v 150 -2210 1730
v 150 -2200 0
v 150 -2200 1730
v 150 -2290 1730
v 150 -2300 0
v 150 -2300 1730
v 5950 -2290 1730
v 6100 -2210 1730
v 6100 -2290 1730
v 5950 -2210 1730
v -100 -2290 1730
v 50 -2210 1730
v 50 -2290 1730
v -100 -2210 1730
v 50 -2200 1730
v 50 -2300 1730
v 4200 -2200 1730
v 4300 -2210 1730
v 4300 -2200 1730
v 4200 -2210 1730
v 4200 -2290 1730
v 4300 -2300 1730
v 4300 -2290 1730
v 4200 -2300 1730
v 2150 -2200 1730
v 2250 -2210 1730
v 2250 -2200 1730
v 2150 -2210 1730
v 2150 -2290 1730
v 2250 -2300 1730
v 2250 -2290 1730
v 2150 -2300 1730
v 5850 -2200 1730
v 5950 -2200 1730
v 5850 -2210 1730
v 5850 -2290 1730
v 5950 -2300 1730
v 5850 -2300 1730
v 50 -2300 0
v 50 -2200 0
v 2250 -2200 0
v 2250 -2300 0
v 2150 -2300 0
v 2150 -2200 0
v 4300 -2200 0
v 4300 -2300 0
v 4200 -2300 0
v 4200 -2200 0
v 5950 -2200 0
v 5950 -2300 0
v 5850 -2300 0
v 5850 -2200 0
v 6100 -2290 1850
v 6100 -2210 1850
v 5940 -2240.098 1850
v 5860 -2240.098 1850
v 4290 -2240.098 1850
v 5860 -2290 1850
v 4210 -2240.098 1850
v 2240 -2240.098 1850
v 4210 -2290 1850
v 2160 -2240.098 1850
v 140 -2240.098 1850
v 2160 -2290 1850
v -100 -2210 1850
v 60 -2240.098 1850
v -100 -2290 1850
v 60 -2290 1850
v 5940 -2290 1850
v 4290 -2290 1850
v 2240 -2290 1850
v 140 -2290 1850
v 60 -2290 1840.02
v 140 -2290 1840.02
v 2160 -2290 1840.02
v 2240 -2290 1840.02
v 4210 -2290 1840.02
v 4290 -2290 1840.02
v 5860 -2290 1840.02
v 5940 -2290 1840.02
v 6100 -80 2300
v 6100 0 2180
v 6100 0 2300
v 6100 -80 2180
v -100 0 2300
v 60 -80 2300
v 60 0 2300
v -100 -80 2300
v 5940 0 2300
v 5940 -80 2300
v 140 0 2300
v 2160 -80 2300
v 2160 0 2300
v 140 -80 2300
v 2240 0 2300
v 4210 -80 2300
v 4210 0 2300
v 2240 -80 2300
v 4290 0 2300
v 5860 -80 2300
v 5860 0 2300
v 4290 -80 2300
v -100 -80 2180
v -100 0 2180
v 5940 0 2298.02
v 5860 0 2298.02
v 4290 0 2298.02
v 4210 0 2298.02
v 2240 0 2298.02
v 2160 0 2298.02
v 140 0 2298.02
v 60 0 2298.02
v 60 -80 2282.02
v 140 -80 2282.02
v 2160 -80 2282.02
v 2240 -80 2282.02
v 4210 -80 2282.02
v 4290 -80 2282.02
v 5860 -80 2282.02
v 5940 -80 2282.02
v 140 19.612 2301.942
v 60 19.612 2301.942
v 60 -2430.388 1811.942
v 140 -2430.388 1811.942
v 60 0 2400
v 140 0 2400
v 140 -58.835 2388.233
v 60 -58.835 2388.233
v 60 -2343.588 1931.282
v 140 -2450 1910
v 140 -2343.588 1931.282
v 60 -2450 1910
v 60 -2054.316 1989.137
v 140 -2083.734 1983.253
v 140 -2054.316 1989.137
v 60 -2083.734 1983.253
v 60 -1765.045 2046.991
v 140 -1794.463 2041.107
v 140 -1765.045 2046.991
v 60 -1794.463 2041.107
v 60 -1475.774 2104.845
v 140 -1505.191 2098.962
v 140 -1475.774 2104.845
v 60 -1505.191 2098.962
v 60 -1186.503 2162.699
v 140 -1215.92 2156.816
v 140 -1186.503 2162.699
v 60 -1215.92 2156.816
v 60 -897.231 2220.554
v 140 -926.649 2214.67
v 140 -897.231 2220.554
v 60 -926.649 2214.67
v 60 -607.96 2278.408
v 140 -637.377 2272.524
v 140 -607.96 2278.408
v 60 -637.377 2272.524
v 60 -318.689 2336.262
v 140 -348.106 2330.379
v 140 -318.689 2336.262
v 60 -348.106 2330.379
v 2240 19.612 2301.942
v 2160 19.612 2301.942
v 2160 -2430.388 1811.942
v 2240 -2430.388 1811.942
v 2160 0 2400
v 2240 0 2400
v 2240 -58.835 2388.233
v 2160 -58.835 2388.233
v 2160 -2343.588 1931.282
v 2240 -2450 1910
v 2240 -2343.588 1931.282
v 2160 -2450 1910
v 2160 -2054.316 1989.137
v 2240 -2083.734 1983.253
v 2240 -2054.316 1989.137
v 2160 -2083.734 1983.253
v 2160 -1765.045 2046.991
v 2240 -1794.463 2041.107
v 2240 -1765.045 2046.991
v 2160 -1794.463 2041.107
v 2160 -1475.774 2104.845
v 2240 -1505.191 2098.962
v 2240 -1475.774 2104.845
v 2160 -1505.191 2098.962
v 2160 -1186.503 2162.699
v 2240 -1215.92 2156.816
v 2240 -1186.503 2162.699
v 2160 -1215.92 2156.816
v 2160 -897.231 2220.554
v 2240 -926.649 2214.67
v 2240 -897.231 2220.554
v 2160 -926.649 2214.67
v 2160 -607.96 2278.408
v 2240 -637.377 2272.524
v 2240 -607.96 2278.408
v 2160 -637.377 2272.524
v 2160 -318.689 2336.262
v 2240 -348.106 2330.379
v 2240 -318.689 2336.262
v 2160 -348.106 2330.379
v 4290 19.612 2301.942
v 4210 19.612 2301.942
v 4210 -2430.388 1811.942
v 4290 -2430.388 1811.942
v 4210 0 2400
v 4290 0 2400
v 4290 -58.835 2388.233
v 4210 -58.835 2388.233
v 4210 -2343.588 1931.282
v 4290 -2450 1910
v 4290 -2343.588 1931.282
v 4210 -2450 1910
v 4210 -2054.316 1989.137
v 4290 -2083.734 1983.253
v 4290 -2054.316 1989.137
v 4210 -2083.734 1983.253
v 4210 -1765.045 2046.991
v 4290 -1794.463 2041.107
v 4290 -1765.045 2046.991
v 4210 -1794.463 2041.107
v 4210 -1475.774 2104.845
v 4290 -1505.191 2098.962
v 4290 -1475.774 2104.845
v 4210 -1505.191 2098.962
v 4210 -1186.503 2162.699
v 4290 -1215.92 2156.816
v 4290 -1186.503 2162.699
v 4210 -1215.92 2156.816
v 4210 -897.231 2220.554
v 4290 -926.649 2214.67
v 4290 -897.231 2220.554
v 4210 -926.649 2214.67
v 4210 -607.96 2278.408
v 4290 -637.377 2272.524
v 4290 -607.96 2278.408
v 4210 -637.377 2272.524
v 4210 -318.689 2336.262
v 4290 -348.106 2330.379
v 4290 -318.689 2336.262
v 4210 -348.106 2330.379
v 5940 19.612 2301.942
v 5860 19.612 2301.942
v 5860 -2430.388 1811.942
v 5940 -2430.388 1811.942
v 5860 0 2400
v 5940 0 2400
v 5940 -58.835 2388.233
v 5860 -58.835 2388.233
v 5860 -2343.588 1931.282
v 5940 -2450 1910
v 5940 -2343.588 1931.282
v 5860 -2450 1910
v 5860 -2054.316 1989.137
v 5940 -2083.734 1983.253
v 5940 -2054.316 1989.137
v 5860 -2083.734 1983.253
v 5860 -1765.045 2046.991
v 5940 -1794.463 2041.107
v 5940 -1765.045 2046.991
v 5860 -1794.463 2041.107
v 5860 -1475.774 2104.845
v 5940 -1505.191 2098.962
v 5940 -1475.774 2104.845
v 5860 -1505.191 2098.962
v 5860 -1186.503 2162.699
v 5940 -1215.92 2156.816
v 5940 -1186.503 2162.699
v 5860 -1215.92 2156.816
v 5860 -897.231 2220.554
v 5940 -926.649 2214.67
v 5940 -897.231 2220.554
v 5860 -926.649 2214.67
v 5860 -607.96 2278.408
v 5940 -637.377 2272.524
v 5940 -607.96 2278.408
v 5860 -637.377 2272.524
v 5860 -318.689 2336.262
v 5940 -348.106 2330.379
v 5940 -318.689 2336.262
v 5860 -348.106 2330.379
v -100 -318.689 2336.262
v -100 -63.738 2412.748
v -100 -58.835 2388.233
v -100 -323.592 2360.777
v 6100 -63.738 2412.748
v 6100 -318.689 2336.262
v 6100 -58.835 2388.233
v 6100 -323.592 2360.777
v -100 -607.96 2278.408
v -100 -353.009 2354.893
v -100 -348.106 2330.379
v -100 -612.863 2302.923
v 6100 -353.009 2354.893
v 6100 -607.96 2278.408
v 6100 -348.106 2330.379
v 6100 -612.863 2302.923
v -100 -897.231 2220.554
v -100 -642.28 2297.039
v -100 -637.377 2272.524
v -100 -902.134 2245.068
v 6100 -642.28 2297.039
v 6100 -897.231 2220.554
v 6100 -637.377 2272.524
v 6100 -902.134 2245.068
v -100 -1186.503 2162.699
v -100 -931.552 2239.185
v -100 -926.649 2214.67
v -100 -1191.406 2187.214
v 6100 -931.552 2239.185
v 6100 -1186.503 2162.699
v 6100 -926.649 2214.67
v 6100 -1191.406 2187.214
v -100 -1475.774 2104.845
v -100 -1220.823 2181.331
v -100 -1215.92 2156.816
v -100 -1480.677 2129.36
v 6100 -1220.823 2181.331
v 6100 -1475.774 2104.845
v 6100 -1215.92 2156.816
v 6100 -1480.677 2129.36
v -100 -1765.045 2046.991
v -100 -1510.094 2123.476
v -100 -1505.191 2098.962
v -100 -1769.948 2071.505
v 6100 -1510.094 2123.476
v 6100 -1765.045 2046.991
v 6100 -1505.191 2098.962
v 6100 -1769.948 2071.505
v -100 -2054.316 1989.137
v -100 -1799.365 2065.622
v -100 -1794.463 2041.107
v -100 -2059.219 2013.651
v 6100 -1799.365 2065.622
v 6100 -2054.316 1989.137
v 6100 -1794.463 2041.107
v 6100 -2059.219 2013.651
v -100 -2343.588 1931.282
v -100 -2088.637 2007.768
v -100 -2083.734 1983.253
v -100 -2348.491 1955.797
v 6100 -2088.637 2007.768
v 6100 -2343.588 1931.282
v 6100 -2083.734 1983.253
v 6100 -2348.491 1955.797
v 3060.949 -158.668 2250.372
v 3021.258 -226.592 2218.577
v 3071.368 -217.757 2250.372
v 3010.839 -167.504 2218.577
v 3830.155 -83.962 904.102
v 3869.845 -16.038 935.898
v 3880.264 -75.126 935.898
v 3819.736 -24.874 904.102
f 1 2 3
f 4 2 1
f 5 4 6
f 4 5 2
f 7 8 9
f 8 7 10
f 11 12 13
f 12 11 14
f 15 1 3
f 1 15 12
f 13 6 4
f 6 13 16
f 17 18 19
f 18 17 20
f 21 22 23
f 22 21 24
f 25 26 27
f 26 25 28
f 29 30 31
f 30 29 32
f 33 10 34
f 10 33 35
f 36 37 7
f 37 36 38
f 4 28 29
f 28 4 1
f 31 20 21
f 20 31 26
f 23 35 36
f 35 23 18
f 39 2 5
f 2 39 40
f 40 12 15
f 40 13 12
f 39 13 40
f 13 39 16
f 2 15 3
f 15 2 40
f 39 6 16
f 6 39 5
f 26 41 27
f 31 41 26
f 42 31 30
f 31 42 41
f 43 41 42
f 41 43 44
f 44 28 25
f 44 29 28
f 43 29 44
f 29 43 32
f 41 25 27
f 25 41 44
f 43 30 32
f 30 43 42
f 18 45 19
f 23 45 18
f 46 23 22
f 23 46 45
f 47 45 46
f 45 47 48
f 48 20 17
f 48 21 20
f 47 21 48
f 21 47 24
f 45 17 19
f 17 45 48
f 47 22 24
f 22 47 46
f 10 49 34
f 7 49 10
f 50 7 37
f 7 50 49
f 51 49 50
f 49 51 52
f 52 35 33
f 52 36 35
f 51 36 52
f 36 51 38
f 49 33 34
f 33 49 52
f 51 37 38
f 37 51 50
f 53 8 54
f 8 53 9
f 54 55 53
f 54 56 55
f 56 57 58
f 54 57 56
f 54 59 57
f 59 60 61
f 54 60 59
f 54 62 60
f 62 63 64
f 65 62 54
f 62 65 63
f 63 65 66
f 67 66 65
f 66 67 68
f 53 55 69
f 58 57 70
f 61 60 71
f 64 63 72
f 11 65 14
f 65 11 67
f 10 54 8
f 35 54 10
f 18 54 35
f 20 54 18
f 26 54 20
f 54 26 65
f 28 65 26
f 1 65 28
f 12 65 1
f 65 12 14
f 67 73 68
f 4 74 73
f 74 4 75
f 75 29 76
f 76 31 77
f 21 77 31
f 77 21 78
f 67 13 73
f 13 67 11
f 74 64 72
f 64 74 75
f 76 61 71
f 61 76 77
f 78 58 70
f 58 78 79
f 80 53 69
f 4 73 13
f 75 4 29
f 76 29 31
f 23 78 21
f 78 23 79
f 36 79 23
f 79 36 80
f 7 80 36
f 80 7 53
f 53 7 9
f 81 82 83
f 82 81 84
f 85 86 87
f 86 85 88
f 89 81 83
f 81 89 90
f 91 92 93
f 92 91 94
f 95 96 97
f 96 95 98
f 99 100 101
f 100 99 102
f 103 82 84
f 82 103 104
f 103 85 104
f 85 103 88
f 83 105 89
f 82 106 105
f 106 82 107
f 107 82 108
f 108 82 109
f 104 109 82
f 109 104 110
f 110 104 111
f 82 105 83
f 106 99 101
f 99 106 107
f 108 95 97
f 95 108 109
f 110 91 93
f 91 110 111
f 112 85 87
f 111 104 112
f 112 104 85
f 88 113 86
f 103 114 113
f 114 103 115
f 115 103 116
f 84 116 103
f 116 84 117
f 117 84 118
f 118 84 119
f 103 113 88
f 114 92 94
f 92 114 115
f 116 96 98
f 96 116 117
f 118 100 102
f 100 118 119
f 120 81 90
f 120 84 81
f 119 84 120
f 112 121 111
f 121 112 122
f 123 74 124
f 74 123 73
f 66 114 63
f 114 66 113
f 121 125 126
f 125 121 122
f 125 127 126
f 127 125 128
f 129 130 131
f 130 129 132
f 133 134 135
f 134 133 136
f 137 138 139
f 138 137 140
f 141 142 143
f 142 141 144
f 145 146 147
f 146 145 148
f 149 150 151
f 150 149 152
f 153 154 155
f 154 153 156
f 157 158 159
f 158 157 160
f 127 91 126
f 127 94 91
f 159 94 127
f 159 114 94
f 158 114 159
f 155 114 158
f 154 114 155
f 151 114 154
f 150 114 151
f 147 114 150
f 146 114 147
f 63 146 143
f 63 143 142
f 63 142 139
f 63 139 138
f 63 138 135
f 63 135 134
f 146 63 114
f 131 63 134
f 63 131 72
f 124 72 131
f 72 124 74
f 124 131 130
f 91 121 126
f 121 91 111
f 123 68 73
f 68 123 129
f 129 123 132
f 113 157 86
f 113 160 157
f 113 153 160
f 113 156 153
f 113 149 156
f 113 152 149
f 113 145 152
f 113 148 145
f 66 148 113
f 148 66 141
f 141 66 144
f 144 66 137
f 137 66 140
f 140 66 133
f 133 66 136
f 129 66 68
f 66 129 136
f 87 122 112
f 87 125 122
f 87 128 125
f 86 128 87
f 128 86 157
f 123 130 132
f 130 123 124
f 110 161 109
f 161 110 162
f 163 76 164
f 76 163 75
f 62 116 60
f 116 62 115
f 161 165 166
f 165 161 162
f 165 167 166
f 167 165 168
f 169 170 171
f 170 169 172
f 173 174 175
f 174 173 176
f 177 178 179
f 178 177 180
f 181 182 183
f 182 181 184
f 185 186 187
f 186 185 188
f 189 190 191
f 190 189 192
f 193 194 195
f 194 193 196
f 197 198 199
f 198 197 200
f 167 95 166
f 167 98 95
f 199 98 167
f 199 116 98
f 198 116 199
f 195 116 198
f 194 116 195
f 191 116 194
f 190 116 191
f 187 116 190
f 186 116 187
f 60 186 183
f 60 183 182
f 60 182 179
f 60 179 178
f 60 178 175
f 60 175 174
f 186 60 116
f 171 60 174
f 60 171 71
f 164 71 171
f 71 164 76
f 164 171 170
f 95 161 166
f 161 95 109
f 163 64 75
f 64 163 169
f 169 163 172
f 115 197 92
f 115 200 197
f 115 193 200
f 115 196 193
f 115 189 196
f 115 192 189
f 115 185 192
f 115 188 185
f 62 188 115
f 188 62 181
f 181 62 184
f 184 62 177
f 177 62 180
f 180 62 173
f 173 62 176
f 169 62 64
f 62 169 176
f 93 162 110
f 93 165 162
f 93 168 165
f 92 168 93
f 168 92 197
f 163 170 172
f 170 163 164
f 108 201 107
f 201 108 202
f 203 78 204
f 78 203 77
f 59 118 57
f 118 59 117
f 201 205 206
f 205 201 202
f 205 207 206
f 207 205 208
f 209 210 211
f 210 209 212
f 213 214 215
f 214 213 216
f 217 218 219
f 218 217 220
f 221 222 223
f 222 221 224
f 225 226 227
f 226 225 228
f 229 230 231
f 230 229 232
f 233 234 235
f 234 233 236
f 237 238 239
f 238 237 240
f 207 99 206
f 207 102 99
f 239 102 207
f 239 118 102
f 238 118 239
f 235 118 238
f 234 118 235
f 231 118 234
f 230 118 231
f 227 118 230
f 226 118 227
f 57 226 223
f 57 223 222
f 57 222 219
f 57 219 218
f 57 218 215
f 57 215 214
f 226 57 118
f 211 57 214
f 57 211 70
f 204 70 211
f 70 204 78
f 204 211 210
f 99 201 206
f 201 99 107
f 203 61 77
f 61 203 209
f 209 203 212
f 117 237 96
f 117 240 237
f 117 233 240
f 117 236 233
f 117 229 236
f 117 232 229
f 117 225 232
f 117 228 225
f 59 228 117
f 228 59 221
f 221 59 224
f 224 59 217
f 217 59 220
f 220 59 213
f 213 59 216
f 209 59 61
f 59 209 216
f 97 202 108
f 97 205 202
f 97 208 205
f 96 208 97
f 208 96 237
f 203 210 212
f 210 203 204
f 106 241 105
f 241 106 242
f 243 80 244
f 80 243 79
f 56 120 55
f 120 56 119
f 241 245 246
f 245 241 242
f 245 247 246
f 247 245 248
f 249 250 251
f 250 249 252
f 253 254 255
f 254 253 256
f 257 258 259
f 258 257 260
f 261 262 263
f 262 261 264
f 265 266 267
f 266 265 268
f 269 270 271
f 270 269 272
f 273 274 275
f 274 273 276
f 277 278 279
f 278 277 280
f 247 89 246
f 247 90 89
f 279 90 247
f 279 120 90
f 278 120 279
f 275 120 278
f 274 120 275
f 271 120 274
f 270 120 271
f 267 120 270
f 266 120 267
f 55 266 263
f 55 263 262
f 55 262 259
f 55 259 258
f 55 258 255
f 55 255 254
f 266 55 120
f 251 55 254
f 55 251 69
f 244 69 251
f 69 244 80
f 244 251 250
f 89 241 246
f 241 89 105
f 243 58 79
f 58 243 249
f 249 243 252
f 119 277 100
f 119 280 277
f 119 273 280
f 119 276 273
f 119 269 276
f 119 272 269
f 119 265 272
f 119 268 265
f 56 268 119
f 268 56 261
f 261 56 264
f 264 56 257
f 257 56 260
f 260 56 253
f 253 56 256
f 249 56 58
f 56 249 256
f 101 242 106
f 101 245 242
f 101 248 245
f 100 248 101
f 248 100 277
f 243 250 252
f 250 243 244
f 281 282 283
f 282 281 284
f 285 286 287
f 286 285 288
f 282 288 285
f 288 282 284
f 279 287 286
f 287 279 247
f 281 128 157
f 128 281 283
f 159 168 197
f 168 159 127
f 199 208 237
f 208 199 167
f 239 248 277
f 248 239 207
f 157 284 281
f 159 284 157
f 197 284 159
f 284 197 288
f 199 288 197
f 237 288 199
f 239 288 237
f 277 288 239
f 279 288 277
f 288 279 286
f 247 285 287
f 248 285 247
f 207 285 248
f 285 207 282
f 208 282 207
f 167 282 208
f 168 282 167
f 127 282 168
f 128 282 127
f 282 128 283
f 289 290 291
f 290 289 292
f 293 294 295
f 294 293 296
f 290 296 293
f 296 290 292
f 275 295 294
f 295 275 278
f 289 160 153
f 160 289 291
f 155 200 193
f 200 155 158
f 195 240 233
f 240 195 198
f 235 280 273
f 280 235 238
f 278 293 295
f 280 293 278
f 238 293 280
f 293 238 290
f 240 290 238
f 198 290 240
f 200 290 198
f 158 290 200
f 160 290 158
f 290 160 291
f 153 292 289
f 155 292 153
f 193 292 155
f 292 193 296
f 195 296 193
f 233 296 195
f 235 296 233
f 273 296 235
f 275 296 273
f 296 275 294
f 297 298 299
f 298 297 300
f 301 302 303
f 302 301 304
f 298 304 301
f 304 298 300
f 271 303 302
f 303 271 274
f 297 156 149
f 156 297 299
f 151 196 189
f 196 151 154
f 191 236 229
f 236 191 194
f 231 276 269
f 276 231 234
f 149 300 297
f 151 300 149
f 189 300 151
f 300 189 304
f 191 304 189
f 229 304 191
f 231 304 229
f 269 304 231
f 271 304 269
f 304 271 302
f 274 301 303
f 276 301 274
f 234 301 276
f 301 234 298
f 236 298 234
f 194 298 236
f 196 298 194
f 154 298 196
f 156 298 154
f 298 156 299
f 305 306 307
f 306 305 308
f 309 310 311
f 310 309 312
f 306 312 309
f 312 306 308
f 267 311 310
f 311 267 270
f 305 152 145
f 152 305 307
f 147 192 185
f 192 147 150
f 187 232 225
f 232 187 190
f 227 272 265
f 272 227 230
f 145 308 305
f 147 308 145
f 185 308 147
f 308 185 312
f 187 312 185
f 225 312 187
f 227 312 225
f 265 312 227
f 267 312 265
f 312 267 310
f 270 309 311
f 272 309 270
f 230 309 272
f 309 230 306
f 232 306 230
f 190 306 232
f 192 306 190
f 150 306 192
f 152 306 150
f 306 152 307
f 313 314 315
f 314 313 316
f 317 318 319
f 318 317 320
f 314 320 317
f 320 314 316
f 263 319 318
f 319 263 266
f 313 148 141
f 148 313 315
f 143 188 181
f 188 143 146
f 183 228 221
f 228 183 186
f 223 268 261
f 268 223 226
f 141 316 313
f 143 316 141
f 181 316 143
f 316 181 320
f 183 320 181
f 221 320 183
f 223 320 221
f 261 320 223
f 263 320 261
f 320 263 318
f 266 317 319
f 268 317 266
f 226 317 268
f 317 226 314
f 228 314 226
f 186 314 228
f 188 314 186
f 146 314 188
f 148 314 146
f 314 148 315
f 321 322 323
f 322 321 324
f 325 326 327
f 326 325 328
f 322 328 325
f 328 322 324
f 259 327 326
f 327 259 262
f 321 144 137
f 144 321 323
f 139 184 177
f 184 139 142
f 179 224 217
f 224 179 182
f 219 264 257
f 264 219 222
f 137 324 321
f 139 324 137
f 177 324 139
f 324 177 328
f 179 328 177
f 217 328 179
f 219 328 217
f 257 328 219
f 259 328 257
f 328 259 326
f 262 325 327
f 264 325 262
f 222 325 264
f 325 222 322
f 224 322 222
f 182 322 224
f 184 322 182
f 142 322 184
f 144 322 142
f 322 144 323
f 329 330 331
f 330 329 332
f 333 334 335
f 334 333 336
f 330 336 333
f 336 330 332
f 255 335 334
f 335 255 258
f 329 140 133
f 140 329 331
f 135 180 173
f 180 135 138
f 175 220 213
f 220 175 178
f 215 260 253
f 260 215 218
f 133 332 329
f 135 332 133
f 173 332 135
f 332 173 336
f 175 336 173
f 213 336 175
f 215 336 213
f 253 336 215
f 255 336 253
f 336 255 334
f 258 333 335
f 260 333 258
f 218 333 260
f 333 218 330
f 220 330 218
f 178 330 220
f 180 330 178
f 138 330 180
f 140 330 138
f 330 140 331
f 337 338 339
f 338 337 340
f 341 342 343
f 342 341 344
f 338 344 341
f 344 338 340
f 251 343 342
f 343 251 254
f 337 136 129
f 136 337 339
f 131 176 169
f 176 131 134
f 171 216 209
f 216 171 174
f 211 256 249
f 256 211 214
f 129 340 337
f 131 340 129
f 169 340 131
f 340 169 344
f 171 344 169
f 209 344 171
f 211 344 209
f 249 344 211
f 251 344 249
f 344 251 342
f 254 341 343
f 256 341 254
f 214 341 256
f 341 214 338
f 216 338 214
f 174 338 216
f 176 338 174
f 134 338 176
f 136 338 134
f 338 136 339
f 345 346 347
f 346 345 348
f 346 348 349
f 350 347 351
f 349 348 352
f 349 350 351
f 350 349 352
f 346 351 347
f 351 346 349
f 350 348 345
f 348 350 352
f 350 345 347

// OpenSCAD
// file: tea_shop_pergola_parameters.scad
// =============================================================================
// Tea Shop — GROUP 3: PERGOLA PARAMETERS
// -----------------------------------------------------------------------------
// All units: mm (1000 mm = 1.0 m), real-life scale.
// Shared global coordinate system (identical to Groups 1 & 2):
//   +X -> left -> right  (0 = left outer wall face, BUILD_W = right outer wall)
//   +Y -> front -> back  (0 = front eave wall face, BUILD_D = back wall)
//   +Z -> up             (0 = ground / plinth top datum)
//   Porch canopy extends in negative Y (forward, from Y = 0 to Y ≈ -2450 mm).
// =============================================================================

// --- SHARED GLOBAL VARIABLES (from Groups 1 & 2 — identical values) ----------
WALL_T  = 250;   // wall panel thickness                      (0.25 m)
BUILD_W = 6000;  // building width along X                    (6.00 m)
BUILD_D = 4000;  // building depth along Y                    (4.00 m)
BACK_H  = 3200;  // wall height at BACK (tall lean-to side)   (3.20 m)
FRONT_H = 2400;  // wall height at FRONT eave (short side)    (2.40 m)

// Group 1 alias names
wall_thickness    = WALL_T;
building_width    = BUILD_W;
building_depth    = BUILD_D;
back_height       = BACK_H;
front_eave_height = FRONT_H;

// Group 1 front opening & plinth references:
sill_height       = 900;   // knee-wall sill datum where brace foot rests (0.90 m)
base_front_margin = 3000;  // total front porch slab depth               (3.00 m)

// Group 2 roof slope derivation (pergola slope follows this exact angle):
ROOF_RISE  = BACK_H - FRONT_H;  // 800 mm
ROOF_RUN   = BUILD_D;            // 4000 mm
ROOF_ANGLE = atan(ROOF_RISE / ROOF_RUN); // ~11.3099°


// =============================================================================
// GROUP 3 PARAMETERS — Pergola Structure & Dimensions
// =============================================================================

// --- Post Cross-Section & Layout ---------------------------------------------
// REFERENCE NOTE: Posts are square timber (~100x100 mm), confirmed from
// wireframe (countryside-tea-shop-3d-model-9cc7378ff7.webp).
POST_SIZE = 100;  // square timber post dimension (100 mm × 100 mm) (0.10 m)

// Y coordinate of the front posts line:
// Placed at Y = -2250 mm (~75% forward across the 3.0 m porch slab),
// leaving ~750 mm open patio in front of posts as shown in reference renders.
POST_Y    = -2250;

// Array of 4 post positions [X, Y]:
// Derived from front elevation proportions:
//   - Post 1 (X=100)  : near left edge of pergola / bench area
//   - Post 2 (X=2200) : intermediate post subdividing wide 3.4m service window span
//   - Post 3 (X=4250) : positioned at mid-pier directly supporting signboard
//   - Post 4 (X=5900) : near right corner of pergola
PERGOLA_POST_POSITIONS = [
    [100,  POST_Y],  // Post 1: Front-Left
    [2200, POST_Y],  // Post 2: Front-Mid-Left
    [4250, POST_Y],  // Post 3: Front-Mid-Right (under "TEA SHOP" sign)
    [5900, POST_Y]   // Post 4: Front-Right
];

// --- Beam Dimensions ---------------------------------------------------------
MAIN_BEAM_WIDTH  = 80;   // thickness of header & ledger beams along Y (0.08 m)
MAIN_BEAM_HEIGHT = 120;  // vertical depth of header & ledger beams    (0.12 m)

// --- Cross Beams / Rafters ---------------------------------------------------
CROSS_BEAM_WIDTH  = 80;   // rafter timber thickness along X            (0.08 m)
CROSS_BEAM_HEIGHT = 100;  // rafter timber depth normal to slope        (0.10 m)

// Rafter X positions aligning directly over the 4 posts:
CROSS_BEAM_X_POSITIONS = [100, 2200, 4250, 5900];

// Sloped length of rafter from front wall (Y=0) to 200 mm past the posts:
CROSS_BEAM_SLOPE_LEN = (abs(POST_Y) + 200) / cos(ROOF_ANGLE);

// --- Pergola Slope Datum & Post Height Derivation ----------------------------
// The pergola roof slopes DOWNWARDS from the front wall eave (Y=0, Z=FRONT_H)
// toward the front posts (Y=POST_Y).
// Under the slope, the rafter top is at: FRONT_H - abs(POST_Y) * tan(ROOF_ANGLE).
// Below the rafters is the header beam (MAIN_BEAM_HEIGHT).
// Post tops touch the underside of the header beam:
PERGOLA_EAVE_Z = FRONT_H;
POST_HEIGHT    = PERGOLA_EAVE_Z - abs(POST_Y) * tan(ROOF_ANGLE) - CROSS_BEAM_HEIGHT - MAIN_BEAM_HEIGHT;

// --- Diagonal Prop Brace -----------------------------------------------------
// Single prop strut visible in window wireframe (8ffafd36e4.webp), anchoring
// near the counter sill and rising diagonally to the overhead rafter.
BRACE_WIDTH     = 60;   // diagonal brace width                       (0.06 m)
BRACE_THICKNESS = 60;   // diagonal brace thickness                   (0.06 m)
BRACE_LENGTH    = 1550; // length along diagonal strut axis           (1.55 m)
BRACE_ANGLE     = 32;   // angle of brace from vertical in degrees

// --- Slatted Roof Canopy (Planks) --------------------------------------------
// 8 flat timber planks running along X (spanning full width), arrayed along
// the slope from the front wall eave to cantilever slightly past the front posts.
SLAT_WIDTH        = 265;  // width of each individual wooden plank      (0.265 m)
SLAT_THICKNESS    = 25;   // thickness of timber plank                  (0.025 m)
SLAT_GAP          = 30;   // air gap between consecutive slats          (0.030 m)
SLAT_COUNT        = 8;    // count matching 8 planks visible in wireframe
SLAT_LENGTH       = 6200; // full span along X (covers 6000 mm + 100 mm side margins)
SLAT_START_OFFSET = 60;   // distance along slope from wall face to first slat (mm)
// main file
// =============================================================================
// Tea Shop — GROUP 3: PERGOLA MODULE LIBRARY
// -----------------------------------------------------------------------------
// Defines all pergola part modules. Creates NO geometry on its own when
// included, allowing individual part_*.scad export files and the assembly
// preview file to include it cleanly.
//
// SHARED GLOBAL COORDINATE SYSTEM (identical to Groups 1 & 2):
//   +X -> left -> right  (0 = left outer wall face, BUILD_W = right outer wall)
//   +Y -> front -> back  (0 = front eave wall face, BUILD_D = back wall)
//   +Z -> up             (0 = ground / plinth top datum)
//   Porch canopy extends in negative Y (forward, from Y = 0 to Y ≈ -2450 mm).
//
// SLOPE CORRECTION:
//   Because the porch is in the negative Y direction (-Y), applying a POSITIVE
//   rotation `rotate([ROOF_ANGLE, 0, 0])` causes the coordinate `[0, -y, 0]`
//   to rotate DOWNWARD into negative Z: `Z = -y * sin(ROOF_ANGLE)`.
//   This ensures the pergola rafters and slats slope DOWNWARDS toward the front
//   posts, resting flush and continuous with the building's roof line.
//
// TODO: The hanging "TEA SHOP" sign and its mounting bracket (a later group)
//       will attach to the main header beam / roof slats near Post 3 (X=4250).
// TODO: The customer bench, stools, and water dispenser stand (later groups)
//       sit on the base slab beneath this pergola structure at Z=0.
// =============================================================================

include <tea_shop_pergola_parameters.scad>;


// =============================================================================
// MODULE 1: pergola_post()
// -----------------------------------------------------------------------------
// A single vertical square timber post modeled at the local origin:
//   Centred in X and Y ([-POST_SIZE/2 .. +POST_SIZE/2]), rising from Z=0
//   to Z=POST_HEIGHT (touching the underside of the front header beam).
// Instanced 4 times via translate() in assemble() — single reusable module.
// =============================================================================
module pergola_post() {
    translate([-POST_SIZE/2, -POST_SIZE/2, 0])
        cube([POST_SIZE, POST_SIZE, POST_HEIGHT]);
}


// =============================================================================
// MODULE 2: pergola_main_beam()
// -----------------------------------------------------------------------------
// The horizontal primary beam system:
//   1. Front header beam: spans across all 4 post tops at Y = POST_Y,
//      distributing load and directly supporting the sloped rafters.
//   2. Rear ledger beam: runs along the front wall eave (Y=0), supporting
//      the upper ends of the rafters.
// =============================================================================
module pergola_main_beam() {
    // 1. Front header beam resting directly on top of the front posts
    translate([-100, POST_Y - MAIN_BEAM_WIDTH/2, POST_HEIGHT])
        cube([BUILD_W + 200, MAIN_BEAM_WIDTH, MAIN_BEAM_HEIGHT]);

    // 2. Rear wall ledger beam anchored to the front wall below the eave
    translate([-100, -MAIN_BEAM_WIDTH, PERGOLA_EAVE_Z - MAIN_BEAM_HEIGHT - CROSS_BEAM_HEIGHT])
        cube([BUILD_W + 200, MAIN_BEAM_WIDTH, MAIN_BEAM_HEIGHT]);
}


// =============================================================================
// MODULE 3: pergola_diagonal_brace()
// -----------------------------------------------------------------------------
// A single diagonal timber brace modeled at local origin. Oriented at BRACE_ANGLE
// from vertical. Instanced at the service counter sill to support the overhead
// rafter beam, exactly as shown in the reference wireframe pass.
// =============================================================================
module pergola_diagonal_brace() {
    rotate([0, -BRACE_ANGLE, 10])
        translate([-BRACE_WIDTH/2, -BRACE_THICKNESS/2, 0])
            cube([BRACE_WIDTH, BRACE_THICKNESS, BRACE_LENGTH]);
}


// =============================================================================
// MODULE 4: pergola_cross_beam()
// -----------------------------------------------------------------------------
// A single sloped rafter running perpendicular to the building (in Y direction).
// Modeled at local origin (X=0) and sloped DOWNWARD at ROOF_ANGLE:
//   - Starts at the front wall ledger beam (Y=0)
//   - Slopes down to bear across the front header beam at POST_Y
//   - Projects 200 mm past the posts as an exposed rafter tail
// =============================================================================
module pergola_cross_beam() {
    translate([0, 0, PERGOLA_EAVE_Z])
        rotate([ROOF_ANGLE, 0, 0])
            translate([-CROSS_BEAM_WIDTH/2, -CROSS_BEAM_SLOPE_LEN, -CROSS_BEAM_HEIGHT])
                cube([CROSS_BEAM_WIDTH, CROSS_BEAM_SLOPE_LEN, CROSS_BEAM_HEIGHT]);
}


// =============================================================================
// MODULE 5: pergola_slat()
// -----------------------------------------------------------------------------
// A single flat timber canopy plank running along X (spanning the full width).
// Instanced and arrayed in assemble() via a for loop down the sloped plane,
// resting directly on top of the rafters.
// =============================================================================
module pergola_slat() {
    translate([-100, -SLAT_WIDTH, 0])
        cube([SLAT_LENGTH, SLAT_WIDTH, SLAT_THICKNESS]);
}


// =============================================================================
// ASSEMBLE MODULE — Visual verification preview (not for export)
// -----------------------------------------------------------------------------
// Press F5 in OpenSCAD to view all Group 3 pergola components together in color.
// For individual STL export, use the dedicated part_*.scad files.
// =============================================================================
module assemble() {
    // 1. Posts (4 instances positioned in shared global coordinates)
    color("SaddleBrown") {
        for (pos = PERGOLA_POST_POSITIONS) {
            translate([pos[0], pos[1], 0])
                pergola_post();
        }
    }

    // 2. Main horizontal beams (front header + rear ledger)
    color("Peru")
        pergola_main_beam();

    // 3. Cross beams / rafters (4 instances positioned over each post line)
    color("BurlyWood") {
        for (x = CROSS_BEAM_X_POSITIONS) {
            translate([x, 0, 0])
                pergola_cross_beam();
        }
    }

    // 4. Slatted canopy roof (8 flat planks arrayed along the slope)
    color("DarkGoldenrod") {
        for (i = [0 : SLAT_COUNT - 1]) {
            dist = SLAT_START_OFFSET + i * (SLAT_WIDTH + SLAT_GAP);
            translate([0, 0, PERGOLA_EAVE_Z])
                rotate([ROOF_ANGLE, 0, 0])
                    translate([0, -dist, 0])
                        pergola_slat();
        }
    }

    // 5. Diagonal prop brace (anchored at the service window counter sill)
    color("DarkSlateGray") {
        translate([3850, -50, sill_height + 20])
            pergola_diagonal_brace();
    }
}

// Default preview invocation:
assemble();
